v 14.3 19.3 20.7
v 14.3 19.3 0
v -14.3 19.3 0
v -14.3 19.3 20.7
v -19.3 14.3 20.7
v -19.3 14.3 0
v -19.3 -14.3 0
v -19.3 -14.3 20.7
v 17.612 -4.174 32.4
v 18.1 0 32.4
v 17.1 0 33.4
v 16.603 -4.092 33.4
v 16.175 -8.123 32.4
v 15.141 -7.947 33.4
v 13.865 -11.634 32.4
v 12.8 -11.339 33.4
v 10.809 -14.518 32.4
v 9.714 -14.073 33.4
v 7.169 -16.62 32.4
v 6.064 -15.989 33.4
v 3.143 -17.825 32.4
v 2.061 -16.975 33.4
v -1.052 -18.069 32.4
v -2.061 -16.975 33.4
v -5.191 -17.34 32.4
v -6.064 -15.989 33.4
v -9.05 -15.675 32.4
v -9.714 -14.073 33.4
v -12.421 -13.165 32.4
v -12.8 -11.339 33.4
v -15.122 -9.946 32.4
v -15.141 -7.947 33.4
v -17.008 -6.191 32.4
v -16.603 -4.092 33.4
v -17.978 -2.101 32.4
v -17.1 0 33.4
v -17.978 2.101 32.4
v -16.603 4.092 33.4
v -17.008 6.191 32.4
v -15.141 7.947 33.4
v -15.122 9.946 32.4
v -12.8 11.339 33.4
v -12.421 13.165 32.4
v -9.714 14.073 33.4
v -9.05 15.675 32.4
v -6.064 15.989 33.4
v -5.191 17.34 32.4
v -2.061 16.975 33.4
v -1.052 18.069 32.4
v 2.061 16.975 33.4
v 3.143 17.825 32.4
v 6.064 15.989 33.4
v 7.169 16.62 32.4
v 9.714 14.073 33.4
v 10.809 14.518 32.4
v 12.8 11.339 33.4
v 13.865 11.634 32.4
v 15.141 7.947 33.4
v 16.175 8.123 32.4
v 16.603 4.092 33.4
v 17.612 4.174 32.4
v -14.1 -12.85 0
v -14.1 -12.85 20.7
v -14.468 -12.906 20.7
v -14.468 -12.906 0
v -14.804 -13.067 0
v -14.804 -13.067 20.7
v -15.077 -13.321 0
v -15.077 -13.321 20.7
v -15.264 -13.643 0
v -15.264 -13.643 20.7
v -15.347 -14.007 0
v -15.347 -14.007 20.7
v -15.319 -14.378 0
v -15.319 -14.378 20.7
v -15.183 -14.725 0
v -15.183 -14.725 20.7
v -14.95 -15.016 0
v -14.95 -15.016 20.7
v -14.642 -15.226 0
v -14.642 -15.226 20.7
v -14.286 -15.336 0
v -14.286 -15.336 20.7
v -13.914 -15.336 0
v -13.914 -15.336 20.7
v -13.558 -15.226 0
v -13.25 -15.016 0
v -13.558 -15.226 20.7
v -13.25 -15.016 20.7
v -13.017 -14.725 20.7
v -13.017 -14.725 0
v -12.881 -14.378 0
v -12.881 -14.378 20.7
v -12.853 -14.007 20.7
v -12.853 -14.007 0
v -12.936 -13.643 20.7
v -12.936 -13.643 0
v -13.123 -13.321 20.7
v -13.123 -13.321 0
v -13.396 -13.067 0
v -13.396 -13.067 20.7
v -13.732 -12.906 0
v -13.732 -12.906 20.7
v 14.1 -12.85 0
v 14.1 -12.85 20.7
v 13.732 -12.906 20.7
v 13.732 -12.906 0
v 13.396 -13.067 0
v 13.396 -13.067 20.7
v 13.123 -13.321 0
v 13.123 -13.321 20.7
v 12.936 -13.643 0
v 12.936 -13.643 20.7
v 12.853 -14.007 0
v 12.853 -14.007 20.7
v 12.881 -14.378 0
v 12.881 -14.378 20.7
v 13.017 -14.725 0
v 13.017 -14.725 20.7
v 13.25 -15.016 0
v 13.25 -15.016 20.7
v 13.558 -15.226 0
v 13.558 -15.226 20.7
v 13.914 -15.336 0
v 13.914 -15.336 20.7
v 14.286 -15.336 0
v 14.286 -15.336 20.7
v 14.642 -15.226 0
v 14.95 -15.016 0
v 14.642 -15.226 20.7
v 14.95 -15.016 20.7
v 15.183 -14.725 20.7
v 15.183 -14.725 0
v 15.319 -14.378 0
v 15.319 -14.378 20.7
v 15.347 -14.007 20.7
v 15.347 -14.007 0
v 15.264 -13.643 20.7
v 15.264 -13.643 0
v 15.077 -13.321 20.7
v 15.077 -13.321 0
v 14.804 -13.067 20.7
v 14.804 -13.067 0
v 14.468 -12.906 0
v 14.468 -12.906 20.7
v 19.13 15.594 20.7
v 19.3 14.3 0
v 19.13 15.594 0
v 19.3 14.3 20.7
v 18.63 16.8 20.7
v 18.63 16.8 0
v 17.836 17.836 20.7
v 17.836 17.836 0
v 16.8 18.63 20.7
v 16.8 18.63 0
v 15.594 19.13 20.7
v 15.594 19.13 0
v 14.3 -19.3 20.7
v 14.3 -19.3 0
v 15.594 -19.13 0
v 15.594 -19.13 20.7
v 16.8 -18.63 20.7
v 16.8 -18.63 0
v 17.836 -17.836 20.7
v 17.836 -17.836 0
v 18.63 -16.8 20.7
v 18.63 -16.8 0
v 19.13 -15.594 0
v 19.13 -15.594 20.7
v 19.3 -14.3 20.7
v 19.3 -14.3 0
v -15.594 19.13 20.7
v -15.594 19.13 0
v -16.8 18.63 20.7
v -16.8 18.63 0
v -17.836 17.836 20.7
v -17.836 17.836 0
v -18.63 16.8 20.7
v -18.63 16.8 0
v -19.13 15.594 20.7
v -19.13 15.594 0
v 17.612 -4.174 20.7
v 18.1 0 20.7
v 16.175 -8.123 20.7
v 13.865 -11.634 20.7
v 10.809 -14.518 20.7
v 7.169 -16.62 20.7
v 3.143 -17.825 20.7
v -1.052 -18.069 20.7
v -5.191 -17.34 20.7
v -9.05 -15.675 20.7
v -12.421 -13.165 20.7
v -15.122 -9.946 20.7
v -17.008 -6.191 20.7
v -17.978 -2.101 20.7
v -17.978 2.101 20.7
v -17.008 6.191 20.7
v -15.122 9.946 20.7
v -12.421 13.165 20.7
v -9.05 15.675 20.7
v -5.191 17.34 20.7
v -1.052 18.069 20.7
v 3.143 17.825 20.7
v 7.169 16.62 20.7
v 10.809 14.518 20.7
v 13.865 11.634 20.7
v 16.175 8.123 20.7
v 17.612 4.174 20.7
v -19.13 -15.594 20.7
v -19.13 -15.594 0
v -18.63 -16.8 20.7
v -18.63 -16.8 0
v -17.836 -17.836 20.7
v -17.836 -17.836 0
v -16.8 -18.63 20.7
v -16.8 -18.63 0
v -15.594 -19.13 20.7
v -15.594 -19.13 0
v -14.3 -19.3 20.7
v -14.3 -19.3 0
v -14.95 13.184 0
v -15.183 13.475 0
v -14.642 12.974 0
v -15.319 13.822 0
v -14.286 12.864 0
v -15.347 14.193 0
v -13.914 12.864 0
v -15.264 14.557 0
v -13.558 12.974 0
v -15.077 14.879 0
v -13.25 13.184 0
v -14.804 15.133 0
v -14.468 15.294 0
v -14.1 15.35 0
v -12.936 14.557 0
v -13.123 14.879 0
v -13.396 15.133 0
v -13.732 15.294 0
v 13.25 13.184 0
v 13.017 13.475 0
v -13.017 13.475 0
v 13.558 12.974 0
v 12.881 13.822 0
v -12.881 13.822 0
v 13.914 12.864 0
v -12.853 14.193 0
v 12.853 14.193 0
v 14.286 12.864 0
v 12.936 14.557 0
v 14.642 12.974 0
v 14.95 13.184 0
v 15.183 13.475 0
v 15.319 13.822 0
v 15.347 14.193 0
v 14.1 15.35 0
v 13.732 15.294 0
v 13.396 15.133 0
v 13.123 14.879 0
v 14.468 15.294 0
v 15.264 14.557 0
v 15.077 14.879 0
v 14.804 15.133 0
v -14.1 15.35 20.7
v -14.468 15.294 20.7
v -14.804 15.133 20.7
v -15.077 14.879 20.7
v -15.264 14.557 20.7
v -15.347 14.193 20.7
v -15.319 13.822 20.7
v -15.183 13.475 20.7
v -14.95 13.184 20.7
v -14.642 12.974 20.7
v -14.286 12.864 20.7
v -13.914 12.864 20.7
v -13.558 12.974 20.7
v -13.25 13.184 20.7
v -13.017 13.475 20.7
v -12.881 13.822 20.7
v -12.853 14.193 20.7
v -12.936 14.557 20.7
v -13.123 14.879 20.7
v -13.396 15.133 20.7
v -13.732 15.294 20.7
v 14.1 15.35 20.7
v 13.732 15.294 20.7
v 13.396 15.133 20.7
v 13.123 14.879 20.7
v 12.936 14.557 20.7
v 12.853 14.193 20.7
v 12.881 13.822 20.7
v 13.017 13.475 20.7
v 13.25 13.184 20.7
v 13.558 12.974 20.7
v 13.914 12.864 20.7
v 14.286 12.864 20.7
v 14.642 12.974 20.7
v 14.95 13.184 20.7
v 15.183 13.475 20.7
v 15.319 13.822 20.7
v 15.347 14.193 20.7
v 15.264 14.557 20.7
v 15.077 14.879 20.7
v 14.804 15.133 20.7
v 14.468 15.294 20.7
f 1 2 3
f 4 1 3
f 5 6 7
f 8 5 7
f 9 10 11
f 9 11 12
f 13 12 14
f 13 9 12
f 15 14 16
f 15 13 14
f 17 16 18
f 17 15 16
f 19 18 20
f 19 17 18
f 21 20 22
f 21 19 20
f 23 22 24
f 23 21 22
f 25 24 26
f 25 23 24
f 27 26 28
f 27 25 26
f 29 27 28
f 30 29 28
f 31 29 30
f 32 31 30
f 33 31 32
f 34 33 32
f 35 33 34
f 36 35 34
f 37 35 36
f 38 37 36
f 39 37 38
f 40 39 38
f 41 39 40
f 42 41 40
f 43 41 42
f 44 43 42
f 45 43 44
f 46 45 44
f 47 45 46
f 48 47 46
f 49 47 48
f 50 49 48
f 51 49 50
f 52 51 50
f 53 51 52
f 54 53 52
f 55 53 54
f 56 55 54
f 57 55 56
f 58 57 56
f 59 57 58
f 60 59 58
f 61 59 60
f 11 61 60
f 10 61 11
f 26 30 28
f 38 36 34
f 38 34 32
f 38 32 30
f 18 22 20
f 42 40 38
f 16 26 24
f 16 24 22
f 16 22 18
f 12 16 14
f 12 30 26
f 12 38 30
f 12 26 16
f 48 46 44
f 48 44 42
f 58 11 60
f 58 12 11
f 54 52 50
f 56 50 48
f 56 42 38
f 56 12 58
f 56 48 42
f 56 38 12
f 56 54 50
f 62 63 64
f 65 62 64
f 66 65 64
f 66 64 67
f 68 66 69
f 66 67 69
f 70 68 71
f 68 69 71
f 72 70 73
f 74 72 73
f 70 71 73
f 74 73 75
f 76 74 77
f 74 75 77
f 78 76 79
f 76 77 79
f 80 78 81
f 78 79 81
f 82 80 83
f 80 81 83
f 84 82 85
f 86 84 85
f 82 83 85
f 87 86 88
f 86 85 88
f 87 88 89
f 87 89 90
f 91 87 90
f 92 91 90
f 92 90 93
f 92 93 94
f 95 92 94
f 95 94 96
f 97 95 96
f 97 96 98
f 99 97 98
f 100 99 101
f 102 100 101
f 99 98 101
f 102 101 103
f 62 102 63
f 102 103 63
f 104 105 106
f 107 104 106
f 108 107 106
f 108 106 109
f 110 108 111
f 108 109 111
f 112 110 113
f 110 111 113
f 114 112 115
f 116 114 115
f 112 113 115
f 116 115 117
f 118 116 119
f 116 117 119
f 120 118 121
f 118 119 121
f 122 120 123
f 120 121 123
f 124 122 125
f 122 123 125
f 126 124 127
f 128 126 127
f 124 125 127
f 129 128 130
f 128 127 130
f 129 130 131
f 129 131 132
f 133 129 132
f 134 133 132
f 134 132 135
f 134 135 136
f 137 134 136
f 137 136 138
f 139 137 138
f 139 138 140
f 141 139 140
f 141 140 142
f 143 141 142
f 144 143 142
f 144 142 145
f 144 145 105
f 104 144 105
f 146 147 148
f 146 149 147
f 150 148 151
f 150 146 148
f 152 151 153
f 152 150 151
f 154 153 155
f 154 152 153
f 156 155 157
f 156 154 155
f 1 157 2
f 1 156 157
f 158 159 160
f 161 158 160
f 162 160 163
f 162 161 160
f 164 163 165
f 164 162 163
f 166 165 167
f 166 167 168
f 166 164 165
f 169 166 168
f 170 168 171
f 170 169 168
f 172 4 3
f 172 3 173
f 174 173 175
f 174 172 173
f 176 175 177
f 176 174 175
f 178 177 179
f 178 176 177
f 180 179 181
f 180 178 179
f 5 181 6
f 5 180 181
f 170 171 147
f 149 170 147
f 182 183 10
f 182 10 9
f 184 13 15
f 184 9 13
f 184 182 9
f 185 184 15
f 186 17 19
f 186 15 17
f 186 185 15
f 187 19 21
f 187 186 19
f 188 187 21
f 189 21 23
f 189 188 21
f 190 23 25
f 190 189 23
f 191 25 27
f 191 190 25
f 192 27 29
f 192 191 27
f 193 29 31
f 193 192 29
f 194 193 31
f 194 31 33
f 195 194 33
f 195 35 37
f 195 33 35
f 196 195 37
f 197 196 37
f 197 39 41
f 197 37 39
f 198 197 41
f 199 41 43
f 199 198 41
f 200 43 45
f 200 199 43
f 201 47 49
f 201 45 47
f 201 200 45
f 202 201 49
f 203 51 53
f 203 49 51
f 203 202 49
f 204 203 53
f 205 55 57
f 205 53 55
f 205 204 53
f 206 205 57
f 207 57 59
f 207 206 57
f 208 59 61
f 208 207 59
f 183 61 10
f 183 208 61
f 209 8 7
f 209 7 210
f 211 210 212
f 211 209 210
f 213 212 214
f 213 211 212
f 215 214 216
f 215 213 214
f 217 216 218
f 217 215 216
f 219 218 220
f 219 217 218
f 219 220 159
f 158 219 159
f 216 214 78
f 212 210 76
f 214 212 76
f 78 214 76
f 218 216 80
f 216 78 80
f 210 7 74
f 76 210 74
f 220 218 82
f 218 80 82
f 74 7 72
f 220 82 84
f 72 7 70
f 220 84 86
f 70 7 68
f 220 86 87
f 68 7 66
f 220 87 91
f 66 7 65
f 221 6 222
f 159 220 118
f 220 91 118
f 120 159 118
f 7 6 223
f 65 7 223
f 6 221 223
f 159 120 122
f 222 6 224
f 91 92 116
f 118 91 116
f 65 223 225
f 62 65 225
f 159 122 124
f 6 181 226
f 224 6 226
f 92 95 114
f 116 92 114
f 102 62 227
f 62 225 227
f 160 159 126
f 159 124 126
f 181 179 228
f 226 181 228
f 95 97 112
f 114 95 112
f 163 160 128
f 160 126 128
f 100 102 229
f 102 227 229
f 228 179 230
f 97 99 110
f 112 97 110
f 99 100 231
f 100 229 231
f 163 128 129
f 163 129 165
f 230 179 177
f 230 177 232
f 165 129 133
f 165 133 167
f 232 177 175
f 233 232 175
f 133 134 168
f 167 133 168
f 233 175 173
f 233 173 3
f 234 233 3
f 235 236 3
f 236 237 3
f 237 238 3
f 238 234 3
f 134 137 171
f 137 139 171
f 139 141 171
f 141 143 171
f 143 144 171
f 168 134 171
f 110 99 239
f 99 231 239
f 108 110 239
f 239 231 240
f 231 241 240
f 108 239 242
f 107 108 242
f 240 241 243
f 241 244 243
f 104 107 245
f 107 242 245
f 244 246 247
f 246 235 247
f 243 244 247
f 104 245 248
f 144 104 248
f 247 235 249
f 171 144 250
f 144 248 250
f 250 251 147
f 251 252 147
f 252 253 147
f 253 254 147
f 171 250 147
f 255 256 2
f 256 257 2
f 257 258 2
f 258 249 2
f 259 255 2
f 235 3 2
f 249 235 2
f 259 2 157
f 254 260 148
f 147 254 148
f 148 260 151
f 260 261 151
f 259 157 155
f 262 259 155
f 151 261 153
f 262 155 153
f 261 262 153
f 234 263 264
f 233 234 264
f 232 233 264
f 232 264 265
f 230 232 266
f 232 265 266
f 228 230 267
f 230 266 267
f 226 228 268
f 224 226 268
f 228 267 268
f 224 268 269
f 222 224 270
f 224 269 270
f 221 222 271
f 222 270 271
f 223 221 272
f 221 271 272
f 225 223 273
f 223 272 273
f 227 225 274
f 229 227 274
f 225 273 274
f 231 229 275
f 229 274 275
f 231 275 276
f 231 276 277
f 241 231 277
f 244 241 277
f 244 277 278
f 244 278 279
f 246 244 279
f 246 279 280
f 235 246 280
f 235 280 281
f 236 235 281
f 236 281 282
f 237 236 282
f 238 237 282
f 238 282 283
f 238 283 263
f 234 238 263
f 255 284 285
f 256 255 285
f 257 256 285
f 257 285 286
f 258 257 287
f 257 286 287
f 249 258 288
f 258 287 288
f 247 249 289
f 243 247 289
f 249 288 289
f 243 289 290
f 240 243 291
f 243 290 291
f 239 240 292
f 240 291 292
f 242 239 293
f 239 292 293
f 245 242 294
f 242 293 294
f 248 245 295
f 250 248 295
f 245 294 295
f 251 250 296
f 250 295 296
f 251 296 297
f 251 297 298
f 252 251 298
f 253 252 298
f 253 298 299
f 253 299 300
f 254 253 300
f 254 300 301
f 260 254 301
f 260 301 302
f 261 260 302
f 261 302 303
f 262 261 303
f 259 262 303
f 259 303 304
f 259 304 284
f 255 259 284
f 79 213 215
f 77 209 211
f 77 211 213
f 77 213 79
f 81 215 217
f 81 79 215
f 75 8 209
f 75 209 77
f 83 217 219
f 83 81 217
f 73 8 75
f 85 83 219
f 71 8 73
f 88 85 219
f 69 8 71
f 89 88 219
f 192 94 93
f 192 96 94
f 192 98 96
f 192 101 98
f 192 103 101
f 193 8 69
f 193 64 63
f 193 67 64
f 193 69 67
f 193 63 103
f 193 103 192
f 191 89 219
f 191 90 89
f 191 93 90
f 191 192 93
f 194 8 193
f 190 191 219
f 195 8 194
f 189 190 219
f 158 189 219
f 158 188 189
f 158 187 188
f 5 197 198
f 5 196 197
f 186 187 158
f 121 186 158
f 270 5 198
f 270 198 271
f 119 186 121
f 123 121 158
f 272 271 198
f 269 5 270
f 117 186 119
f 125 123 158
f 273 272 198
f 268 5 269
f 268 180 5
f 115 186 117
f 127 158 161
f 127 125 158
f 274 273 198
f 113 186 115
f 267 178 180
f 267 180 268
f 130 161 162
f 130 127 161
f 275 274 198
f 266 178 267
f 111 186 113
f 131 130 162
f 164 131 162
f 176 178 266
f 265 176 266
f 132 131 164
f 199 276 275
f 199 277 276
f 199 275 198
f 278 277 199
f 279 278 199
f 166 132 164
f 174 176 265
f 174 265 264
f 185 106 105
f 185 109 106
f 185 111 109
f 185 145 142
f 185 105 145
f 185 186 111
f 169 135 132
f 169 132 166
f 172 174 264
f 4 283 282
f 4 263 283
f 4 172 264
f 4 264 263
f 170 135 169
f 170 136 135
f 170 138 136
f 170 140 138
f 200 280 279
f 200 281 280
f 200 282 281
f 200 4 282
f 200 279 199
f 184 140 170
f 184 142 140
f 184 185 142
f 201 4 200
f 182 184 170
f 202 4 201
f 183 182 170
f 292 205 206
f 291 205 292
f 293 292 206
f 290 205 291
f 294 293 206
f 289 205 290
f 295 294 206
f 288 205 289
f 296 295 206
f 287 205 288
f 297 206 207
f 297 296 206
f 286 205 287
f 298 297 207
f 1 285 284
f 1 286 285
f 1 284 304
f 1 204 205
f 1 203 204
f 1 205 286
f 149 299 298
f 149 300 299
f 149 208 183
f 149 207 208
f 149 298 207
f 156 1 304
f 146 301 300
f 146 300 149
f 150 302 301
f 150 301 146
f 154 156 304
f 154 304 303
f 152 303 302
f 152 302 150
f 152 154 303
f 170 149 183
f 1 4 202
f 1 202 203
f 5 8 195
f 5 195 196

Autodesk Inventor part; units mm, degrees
ref_plane "YZ Plane" through (0, 0, 0) normal (1, 0, 0) x (0, 1, 0)
ref_plane "XZ Plane" through (0, 0, 0) normal (0, 1, 0) x (-1, 0, 0)
ref_plane "XY Plane" through (0, 0, 0) normal (0, 0, 1) x (1, 0, 0)
sketch "スケッチ1" plane through (0, 0, 0) normal (0, 0, 1) x (1, 0, 0)
  line L0 (-19.3, -19.3) -> (19.3, -19.3)
  line L1 (19.3, -19.3) -> (19.3, 19.3)
  line L2 (19.3, 19.3) -> (-19.3, 19.3)
  line L3 (-19.3, 19.3) -> (-19.3, -19.3)
  line L4 (-19.3, -19.3) -> (19.3, 19.3) construction
  line L5 (19.3, -19.3) -> (-19.3, 19.3) construction
  point P0 (0, 0)
  dimension "d0" = 38.6
  dimension "d1" = 38.6
extrude "押し出し1" add sketch "スケッチ1" along normal blind 20.7
sketch "スケッチ2" plane through (0, 0, 20.7) normal (0, 0, 1) x (1, 0, 0)
  circle A0 centre (0, 0) radius 18.1
  dimension "d4" = 36.2
extrude "押し出し2" add sketch "スケッチ2" along normal blind 12.7
sketch "スケッチ3" plane through (0, 0, 0) normal (0, 0, -1) x (-1, 0, 0)
  line L0 (-14.1, -14.1) -> (14.1, -14.1) construction
  line L1 (14.1, -14.1) -> (14.1, 14.1) construction
  line L2 (14.1, 14.1) -> (-14.1, 14.1) construction
  line L3 (-14.1, 14.1) -> (-14.1, -14.1) construction
  line L4 (-14.1, -14.1) -> (14.1, 14.1) construction
  line L5 (14.1, -14.1) -> (-14.1, 14.1) construction
  point P0 (0, 0)
  dimension "d7" = 28.2
  dimension "d8" = 28.2
hole "穴1" at (-14.1, 14.1, 0) at (-14.1, -14.1, 0) at (14.1, -14.1, 0) at (14.1, 14.1, 0) direction (0, 0, 1) diameter 2.5 end through all
fillet "フィレット1" radius 5 4 edges at (19.3, 19.3, 10.35) (19.3, -19.3, 10.35) (-19.3, 19.3, 10.35) (-19.3, -19.3, 10.35)
chamfer "面取り1" distance 1 angle 45 1 edges at (-18.1, 0, 33.4)
properties part number "YDLiDAR_T-mini-pro"
